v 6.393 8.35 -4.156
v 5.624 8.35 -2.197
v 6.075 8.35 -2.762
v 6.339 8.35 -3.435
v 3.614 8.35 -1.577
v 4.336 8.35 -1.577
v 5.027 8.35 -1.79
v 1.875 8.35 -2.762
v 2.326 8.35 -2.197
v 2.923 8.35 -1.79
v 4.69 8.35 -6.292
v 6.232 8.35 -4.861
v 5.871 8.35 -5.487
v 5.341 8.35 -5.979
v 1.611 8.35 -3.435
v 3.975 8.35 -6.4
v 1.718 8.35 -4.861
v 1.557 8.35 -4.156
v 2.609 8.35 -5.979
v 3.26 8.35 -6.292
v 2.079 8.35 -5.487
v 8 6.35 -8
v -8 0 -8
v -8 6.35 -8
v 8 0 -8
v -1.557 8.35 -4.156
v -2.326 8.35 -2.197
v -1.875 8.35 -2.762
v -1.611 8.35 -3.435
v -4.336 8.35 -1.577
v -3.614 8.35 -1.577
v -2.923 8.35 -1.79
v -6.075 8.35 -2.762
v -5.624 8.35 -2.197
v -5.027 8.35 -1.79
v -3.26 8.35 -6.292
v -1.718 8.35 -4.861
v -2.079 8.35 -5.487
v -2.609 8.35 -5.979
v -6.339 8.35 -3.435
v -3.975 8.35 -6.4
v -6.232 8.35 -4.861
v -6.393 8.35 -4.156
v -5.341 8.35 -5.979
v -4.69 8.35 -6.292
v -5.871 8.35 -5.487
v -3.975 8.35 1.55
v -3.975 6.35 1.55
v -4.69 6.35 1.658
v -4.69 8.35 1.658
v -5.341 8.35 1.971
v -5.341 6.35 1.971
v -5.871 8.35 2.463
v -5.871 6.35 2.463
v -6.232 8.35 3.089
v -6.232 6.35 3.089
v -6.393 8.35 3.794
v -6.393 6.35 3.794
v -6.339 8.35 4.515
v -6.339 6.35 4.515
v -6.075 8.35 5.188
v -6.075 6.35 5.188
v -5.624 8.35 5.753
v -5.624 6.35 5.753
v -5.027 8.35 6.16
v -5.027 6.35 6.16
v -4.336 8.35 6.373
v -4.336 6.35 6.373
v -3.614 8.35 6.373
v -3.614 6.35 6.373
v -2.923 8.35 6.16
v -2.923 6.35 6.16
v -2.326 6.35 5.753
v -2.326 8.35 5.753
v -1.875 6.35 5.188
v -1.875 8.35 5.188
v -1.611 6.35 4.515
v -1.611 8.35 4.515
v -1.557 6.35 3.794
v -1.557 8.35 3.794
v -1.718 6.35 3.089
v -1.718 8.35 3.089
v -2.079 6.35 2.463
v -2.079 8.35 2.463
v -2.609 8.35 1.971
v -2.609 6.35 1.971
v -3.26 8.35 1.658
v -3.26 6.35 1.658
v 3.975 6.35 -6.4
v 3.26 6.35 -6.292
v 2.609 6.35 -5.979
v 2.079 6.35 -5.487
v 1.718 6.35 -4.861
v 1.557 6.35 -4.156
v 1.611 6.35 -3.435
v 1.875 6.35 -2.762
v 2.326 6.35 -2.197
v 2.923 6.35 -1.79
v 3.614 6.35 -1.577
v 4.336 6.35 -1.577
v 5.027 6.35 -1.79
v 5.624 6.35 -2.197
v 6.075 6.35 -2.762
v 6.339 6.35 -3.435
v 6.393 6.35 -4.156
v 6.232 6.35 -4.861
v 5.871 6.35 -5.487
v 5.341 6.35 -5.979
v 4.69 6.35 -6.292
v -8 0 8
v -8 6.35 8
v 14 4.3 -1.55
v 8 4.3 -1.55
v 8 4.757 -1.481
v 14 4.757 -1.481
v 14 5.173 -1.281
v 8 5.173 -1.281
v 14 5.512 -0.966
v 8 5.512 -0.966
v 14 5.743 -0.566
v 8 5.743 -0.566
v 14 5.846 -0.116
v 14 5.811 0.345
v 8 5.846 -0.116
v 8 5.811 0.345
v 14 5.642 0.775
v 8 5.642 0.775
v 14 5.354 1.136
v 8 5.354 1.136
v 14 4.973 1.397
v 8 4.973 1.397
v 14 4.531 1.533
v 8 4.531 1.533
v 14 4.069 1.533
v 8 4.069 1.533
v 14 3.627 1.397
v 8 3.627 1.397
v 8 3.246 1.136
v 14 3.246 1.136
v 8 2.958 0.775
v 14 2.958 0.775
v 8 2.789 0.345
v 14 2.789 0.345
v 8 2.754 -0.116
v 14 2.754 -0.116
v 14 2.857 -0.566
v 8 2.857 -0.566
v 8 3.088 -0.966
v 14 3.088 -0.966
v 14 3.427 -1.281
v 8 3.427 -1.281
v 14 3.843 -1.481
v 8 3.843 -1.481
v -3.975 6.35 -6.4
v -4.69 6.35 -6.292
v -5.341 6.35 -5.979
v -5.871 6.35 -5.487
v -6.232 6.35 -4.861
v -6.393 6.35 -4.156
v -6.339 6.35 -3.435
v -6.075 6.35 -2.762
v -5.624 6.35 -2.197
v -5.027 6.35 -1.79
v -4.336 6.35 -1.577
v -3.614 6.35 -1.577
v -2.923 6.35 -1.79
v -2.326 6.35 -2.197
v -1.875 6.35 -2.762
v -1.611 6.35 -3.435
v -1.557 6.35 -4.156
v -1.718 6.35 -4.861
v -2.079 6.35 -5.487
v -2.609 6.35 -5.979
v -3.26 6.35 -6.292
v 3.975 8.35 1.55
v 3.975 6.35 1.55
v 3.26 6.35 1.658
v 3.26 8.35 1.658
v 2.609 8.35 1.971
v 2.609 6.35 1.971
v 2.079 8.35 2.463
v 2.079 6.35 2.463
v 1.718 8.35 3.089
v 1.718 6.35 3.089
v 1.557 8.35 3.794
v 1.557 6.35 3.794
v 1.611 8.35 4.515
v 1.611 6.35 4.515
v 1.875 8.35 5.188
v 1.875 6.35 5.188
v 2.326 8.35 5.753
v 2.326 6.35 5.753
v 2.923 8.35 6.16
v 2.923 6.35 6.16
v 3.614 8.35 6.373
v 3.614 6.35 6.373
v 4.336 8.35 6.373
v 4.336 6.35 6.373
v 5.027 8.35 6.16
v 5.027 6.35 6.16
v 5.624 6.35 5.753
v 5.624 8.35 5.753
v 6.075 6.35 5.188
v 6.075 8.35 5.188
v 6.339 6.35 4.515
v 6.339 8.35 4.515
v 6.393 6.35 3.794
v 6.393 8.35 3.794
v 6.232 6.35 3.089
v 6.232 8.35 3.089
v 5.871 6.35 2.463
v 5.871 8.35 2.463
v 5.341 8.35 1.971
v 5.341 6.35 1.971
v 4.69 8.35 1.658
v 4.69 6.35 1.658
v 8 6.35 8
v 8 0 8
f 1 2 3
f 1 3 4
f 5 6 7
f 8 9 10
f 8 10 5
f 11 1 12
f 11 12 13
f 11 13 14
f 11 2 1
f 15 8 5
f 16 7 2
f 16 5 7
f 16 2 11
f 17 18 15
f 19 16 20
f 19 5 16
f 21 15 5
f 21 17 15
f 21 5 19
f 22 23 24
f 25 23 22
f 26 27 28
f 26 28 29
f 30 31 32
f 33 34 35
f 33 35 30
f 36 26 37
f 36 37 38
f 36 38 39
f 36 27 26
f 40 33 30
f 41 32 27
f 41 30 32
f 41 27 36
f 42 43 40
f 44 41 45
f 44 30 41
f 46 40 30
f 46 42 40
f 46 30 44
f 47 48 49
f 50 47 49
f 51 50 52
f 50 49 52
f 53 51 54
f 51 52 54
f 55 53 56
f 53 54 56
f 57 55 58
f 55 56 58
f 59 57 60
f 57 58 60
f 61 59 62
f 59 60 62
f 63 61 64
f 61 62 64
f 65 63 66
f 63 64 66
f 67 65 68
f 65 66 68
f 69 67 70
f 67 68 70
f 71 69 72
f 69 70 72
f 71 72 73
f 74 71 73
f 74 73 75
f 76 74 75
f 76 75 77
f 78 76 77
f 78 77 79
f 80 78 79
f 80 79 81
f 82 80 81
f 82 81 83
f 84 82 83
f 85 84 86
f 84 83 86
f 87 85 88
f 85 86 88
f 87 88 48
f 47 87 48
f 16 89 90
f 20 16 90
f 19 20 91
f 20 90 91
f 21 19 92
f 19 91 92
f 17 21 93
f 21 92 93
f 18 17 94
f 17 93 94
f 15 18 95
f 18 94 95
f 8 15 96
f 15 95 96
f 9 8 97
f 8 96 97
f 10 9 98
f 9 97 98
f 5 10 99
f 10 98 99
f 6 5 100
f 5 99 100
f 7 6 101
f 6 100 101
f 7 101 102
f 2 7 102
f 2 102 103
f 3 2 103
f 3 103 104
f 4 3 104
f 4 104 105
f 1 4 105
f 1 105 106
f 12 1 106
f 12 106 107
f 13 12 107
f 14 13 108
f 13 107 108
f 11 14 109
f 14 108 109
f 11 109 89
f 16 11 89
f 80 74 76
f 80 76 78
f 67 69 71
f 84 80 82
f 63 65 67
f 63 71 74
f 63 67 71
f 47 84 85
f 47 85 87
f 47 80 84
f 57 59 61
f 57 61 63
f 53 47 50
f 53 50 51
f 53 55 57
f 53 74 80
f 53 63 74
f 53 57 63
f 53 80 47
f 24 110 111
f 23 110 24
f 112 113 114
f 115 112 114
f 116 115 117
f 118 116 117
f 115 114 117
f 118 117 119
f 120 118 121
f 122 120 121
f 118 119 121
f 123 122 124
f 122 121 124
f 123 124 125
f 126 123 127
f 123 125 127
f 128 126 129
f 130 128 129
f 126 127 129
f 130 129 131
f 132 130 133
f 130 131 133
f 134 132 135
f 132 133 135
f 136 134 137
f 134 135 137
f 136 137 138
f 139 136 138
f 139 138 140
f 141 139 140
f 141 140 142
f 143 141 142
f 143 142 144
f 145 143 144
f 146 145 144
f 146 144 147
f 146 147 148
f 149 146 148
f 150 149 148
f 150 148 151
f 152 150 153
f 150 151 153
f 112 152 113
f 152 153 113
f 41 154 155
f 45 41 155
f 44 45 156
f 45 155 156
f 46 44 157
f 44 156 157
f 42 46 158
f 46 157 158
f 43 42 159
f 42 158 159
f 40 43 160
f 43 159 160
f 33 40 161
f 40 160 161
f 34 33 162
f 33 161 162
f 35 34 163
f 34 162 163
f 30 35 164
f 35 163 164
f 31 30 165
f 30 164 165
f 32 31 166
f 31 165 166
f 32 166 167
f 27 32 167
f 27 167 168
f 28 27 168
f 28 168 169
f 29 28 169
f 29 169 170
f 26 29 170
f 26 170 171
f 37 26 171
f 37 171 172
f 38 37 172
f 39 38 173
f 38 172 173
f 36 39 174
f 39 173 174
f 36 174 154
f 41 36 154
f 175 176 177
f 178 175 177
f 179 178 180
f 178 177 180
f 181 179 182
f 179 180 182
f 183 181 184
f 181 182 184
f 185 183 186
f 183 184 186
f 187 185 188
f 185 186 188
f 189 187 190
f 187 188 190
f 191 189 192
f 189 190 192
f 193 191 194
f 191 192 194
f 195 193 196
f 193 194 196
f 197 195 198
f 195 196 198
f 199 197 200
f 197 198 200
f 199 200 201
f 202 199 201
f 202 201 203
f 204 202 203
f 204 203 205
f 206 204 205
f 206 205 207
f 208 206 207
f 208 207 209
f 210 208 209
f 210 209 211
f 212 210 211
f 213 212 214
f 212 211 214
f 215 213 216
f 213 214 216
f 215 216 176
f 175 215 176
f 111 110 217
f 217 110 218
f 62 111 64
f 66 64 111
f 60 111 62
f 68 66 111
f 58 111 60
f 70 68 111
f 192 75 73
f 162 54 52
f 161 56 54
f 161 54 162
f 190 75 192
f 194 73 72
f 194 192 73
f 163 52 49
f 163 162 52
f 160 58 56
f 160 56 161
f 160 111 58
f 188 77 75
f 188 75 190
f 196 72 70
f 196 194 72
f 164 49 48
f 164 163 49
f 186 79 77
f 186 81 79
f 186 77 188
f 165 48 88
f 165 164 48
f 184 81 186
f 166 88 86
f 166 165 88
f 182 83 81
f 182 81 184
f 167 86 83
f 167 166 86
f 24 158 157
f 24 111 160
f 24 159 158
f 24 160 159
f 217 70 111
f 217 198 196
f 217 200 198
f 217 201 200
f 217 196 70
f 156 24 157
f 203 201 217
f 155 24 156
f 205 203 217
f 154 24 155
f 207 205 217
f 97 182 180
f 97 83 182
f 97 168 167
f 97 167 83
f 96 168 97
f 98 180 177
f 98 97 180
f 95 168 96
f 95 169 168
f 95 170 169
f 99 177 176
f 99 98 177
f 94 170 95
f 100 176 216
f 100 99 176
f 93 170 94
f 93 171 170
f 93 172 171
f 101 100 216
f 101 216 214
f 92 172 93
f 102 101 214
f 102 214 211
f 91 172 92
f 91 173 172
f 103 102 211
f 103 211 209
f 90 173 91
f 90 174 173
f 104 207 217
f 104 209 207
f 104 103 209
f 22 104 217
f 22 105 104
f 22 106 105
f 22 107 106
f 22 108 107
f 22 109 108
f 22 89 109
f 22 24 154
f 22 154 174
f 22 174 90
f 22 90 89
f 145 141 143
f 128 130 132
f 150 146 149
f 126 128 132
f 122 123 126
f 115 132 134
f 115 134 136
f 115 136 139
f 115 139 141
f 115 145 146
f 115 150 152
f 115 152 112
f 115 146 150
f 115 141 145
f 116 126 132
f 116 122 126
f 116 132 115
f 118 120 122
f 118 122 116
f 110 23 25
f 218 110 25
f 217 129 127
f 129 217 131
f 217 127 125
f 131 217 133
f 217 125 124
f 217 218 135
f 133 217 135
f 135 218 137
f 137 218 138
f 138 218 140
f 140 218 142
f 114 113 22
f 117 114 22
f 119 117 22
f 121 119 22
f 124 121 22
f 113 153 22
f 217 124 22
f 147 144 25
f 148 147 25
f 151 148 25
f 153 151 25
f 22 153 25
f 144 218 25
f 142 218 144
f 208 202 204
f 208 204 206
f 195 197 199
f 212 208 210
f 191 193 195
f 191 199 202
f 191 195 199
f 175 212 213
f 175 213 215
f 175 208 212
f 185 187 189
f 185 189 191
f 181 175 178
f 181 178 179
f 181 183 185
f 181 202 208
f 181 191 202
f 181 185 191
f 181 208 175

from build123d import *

# Parameters (mm, degrees)
SKETCH1_W           = 16
SKETCH1_H           = 16
BOSS_EXTRUDE1_DEPTH = 6.35
BOSS_EXTRUDE2_START = 6.35
SKETCH1_3_R         = 2.425
BOSS_EXTRUDE2_DEPTH = 2
SKETCH2_R           = 1.55
BOSS_EXTRUDE3_DEPTH = 6


with BuildPart() as part:
    # Sketch1 → Boss-Extrude1 (new body)
    with BuildSketch(Plane(origin=(0, 0, 0), x_dir=(1, 0, 0), z_dir=(0, 1, 0))):
        Rectangle(SKETCH1_W, SKETCH1_H)
    extrude(amount=BOSS_EXTRUDE1_DEPTH)

    # Sketch1<3> → Boss-Extrude2 (add)
    with BuildSketch(Plane(origin=(0, 0, 0), x_dir=(1, 0, 0), z_dir=(0, 1, 0)).offset(BOSS_EXTRUDE2_START)):
        with Locations(Location((-3.975, -3.975, 0), (0, 0, 90))):
            Circle(SKETCH1_3_R)
        with Locations(Location((3.975, -3.975, 0), (0, 0, 90))):
            Circle(SKETCH1_3_R)
        with Locations(Location((3.975, 3.975, 0), (0, 0, 90))):
            Circle(SKETCH1_3_R)
        with Locations(Location((-3.975, 3.975, 0), (0, 0, 90))):
            Circle(SKETCH1_3_R)
    extrude(amount=BOSS_EXTRUDE2_DEPTH)

    # Sketch2 → Boss-Extrude3 (add)
    with BuildSketch(Plane(origin=(8, 0, 0), x_dir=(0, 0, -1), z_dir=(1, 0, 0))):
        with Locations((0, 4.3)):
            Circle(SKETCH2_R)
    extrude(amount=BOSS_EXTRUDE3_DEPTH)


solid = part.part
